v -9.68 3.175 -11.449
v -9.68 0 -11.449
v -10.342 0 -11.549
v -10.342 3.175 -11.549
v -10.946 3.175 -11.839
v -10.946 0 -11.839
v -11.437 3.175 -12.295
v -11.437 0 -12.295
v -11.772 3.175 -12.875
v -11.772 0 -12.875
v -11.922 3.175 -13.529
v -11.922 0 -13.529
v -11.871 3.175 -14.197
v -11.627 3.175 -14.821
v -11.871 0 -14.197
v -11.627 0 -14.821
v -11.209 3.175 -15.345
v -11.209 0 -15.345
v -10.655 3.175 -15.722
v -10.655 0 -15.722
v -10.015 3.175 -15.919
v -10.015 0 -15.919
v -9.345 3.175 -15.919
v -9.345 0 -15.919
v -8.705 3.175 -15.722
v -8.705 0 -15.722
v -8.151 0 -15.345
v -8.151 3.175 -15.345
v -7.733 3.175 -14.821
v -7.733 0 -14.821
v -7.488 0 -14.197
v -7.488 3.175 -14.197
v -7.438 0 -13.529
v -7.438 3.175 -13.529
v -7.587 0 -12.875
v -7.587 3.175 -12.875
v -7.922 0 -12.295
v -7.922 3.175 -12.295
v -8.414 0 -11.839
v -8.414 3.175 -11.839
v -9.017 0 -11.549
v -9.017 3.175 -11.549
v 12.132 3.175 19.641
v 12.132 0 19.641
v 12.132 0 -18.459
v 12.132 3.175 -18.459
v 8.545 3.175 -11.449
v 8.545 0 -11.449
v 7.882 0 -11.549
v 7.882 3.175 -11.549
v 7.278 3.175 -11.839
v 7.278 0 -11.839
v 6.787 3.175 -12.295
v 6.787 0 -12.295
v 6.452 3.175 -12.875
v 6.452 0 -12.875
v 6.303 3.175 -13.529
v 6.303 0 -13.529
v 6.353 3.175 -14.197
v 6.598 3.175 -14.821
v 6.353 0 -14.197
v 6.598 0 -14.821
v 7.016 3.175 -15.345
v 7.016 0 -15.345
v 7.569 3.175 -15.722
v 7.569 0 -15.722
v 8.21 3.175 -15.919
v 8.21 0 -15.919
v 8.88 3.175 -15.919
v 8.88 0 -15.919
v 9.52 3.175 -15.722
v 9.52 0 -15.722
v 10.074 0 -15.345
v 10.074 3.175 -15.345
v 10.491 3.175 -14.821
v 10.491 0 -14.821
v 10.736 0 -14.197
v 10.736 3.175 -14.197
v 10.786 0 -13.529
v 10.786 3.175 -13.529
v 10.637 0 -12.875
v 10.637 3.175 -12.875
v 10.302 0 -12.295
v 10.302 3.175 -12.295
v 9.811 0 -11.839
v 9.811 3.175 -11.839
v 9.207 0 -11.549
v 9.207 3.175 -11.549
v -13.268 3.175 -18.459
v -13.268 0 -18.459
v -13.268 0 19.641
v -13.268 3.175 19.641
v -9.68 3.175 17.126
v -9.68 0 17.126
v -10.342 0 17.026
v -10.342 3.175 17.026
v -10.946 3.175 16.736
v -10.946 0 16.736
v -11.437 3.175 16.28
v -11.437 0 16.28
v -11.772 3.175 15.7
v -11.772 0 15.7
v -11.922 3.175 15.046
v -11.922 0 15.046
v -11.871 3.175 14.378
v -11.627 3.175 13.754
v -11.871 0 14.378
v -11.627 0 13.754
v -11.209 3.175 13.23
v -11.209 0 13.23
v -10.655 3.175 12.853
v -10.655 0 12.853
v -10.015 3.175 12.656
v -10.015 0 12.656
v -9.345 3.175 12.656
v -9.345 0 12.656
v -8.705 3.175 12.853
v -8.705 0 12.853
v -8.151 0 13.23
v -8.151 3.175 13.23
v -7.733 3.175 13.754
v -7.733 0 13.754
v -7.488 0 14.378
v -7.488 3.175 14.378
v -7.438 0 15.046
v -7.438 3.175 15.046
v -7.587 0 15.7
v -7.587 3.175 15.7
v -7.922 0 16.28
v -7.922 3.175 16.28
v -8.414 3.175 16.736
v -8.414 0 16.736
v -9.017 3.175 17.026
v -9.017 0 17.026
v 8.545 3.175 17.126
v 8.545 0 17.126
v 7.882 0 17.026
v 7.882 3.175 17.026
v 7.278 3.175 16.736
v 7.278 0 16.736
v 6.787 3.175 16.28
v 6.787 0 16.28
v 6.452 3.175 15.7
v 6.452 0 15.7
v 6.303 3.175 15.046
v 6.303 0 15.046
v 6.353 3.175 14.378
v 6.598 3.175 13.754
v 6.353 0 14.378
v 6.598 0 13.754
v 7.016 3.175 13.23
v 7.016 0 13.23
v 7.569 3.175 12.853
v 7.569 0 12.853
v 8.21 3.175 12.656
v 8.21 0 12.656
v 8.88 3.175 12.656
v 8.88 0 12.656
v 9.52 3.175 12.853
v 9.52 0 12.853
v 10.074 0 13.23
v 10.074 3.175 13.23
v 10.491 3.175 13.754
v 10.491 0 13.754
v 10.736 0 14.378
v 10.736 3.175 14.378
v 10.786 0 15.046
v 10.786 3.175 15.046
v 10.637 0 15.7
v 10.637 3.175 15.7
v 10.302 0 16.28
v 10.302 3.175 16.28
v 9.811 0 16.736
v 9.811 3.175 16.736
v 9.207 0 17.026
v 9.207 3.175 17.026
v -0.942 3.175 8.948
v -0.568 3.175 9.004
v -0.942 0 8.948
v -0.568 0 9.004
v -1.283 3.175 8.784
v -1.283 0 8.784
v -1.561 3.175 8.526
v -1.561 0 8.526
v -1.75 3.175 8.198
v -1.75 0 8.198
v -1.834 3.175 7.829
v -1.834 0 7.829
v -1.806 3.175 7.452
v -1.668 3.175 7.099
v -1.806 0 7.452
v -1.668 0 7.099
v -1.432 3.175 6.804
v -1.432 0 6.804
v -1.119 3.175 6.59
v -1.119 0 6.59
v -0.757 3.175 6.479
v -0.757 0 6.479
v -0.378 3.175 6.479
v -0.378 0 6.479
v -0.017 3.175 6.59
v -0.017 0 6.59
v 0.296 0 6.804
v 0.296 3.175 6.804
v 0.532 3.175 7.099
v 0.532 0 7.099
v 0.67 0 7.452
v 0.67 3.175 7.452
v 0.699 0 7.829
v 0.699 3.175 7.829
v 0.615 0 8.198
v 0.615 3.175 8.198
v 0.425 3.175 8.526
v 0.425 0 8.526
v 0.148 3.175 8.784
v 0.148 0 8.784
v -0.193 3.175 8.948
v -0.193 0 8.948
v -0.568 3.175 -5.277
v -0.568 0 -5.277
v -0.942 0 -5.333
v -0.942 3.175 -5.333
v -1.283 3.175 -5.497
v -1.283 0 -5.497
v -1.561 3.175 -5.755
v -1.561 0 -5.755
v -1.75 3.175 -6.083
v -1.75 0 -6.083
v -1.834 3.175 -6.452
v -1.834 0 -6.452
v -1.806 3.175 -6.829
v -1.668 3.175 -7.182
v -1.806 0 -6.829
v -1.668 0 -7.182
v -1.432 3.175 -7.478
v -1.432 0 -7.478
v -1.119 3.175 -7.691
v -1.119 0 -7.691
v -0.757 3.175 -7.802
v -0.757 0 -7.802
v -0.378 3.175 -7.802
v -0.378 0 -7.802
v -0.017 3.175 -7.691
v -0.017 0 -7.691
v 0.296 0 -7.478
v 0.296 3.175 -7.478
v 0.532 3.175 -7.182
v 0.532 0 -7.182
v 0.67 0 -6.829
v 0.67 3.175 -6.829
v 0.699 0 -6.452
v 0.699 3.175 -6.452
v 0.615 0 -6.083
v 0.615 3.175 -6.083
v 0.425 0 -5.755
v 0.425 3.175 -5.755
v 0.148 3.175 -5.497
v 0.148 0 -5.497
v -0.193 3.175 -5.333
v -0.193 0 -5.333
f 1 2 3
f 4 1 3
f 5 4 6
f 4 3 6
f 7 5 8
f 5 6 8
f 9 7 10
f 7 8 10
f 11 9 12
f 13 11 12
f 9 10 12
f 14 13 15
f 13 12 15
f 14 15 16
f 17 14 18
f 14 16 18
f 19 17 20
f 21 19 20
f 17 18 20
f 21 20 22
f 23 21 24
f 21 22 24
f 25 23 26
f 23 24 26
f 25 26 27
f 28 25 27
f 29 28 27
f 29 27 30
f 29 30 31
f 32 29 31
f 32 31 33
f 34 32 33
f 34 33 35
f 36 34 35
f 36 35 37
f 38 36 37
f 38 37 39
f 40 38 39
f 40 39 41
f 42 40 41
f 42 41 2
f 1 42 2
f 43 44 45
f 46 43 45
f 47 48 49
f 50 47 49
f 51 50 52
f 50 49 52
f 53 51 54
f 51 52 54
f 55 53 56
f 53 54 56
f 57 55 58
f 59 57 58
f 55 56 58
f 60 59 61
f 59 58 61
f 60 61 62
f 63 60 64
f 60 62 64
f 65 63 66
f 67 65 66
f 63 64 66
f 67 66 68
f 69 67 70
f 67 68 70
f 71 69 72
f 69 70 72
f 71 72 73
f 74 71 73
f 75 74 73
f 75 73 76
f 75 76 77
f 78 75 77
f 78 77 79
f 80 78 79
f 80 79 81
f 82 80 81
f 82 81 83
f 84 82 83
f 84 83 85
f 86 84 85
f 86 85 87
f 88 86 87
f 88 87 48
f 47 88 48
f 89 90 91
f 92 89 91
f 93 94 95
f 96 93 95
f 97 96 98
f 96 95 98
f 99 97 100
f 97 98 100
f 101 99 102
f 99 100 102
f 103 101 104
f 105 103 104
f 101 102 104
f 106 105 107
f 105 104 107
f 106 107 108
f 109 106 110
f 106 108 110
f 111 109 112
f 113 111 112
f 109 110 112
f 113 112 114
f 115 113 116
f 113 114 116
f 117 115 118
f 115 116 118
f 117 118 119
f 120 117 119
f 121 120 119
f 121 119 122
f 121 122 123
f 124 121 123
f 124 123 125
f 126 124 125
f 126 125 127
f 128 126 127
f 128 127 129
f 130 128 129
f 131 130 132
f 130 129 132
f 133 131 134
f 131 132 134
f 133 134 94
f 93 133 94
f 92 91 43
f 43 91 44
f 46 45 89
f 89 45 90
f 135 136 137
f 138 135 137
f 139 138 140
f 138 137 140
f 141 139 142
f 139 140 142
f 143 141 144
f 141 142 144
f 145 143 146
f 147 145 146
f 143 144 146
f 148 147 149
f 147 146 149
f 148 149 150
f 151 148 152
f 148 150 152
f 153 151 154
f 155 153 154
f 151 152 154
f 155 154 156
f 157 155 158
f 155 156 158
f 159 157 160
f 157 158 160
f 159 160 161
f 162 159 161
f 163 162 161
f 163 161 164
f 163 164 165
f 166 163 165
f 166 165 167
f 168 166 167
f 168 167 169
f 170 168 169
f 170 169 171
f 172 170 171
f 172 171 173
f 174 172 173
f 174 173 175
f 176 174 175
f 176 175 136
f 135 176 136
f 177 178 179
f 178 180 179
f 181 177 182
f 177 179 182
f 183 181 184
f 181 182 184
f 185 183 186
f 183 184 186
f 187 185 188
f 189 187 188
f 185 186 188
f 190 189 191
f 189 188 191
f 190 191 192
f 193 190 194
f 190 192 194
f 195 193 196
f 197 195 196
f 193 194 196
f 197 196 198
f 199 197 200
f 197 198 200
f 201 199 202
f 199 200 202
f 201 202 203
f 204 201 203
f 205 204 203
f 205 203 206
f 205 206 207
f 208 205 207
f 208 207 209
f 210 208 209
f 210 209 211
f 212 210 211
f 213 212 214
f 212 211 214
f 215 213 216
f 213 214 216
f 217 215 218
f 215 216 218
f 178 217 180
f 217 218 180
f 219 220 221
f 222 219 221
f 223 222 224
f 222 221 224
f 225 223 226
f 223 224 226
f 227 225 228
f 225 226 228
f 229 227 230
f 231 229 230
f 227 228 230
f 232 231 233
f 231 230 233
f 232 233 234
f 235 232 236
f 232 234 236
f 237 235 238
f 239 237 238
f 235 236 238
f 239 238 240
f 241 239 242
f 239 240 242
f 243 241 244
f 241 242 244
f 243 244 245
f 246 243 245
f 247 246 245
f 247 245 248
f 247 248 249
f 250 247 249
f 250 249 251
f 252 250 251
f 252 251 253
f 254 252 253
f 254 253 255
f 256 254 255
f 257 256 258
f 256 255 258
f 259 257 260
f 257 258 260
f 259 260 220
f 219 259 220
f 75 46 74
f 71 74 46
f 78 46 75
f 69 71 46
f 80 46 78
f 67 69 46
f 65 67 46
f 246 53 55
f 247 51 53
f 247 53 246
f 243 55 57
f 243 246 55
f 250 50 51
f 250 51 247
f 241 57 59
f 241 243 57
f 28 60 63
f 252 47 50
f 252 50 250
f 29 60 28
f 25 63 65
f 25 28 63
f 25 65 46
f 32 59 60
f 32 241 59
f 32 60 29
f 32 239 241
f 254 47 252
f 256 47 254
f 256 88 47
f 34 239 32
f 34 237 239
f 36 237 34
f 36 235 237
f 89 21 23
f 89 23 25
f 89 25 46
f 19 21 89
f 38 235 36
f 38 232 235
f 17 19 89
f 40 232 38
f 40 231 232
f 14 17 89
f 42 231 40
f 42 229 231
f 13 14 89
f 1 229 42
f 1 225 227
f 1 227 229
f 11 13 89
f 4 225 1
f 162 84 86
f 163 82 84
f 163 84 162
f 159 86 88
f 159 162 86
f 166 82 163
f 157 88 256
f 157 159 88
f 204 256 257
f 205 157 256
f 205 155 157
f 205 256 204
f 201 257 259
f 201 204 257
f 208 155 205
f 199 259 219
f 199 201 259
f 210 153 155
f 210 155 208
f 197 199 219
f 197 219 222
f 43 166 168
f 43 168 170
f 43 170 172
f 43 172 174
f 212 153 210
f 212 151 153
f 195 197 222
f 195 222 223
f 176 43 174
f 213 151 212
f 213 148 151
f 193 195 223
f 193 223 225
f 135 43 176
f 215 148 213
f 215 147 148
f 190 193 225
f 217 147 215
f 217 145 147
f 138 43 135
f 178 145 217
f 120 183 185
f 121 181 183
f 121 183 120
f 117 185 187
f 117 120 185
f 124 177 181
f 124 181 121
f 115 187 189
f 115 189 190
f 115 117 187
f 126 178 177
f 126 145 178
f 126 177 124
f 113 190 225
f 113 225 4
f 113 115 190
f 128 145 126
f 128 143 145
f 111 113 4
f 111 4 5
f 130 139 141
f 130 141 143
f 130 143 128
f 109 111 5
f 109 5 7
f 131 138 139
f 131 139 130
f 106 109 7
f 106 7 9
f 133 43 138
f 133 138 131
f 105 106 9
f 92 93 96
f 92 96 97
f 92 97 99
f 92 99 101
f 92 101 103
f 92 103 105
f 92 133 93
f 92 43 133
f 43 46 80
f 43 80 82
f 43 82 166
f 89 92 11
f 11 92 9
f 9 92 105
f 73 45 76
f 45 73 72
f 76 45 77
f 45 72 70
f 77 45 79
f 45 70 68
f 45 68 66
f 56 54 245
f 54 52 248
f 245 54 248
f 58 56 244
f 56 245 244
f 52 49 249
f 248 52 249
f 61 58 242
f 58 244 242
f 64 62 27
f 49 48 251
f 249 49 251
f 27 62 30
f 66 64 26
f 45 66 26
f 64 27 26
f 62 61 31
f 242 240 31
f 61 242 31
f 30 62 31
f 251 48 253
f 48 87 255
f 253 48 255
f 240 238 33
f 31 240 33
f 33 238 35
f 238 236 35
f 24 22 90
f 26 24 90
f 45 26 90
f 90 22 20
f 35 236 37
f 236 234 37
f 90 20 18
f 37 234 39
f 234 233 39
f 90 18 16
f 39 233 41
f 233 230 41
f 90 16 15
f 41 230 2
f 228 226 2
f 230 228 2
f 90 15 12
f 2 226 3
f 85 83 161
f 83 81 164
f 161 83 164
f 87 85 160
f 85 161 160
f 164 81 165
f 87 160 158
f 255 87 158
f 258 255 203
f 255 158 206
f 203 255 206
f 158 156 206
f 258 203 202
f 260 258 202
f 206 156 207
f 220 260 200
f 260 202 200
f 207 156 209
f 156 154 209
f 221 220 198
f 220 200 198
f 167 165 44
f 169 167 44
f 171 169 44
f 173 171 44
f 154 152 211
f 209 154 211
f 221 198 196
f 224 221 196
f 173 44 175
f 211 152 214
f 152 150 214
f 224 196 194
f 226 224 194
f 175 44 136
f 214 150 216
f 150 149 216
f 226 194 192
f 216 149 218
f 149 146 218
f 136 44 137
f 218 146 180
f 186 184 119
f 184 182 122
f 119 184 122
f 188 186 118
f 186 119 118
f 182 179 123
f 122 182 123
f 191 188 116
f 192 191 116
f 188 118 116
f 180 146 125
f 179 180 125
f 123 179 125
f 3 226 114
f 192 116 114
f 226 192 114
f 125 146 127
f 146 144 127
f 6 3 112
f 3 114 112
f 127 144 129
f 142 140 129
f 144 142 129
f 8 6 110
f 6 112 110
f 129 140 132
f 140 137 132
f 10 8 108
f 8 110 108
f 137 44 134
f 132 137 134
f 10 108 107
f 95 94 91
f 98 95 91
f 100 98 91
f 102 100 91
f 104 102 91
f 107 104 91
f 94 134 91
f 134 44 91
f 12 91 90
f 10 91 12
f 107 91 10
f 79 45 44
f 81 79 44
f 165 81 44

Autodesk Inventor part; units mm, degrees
ref_plane "YZ Plane" through (0, 0, 0) normal (1, 0, 0) x (0, 1, 0)
ref_plane "XZ Plane" through (0, 0, 0) normal (0, 1, 0) x (-1, 0, 0)
ref_plane "XY Plane" through (0, 0, 0) normal (0, 0, 1) x (1, 0, 0)
sketch "Sketch1" plane through (0, 0, 0) normal (0, 1, 0) x (-1, 0, 0)
  line L0 (13.2677, 19.6408) -> (-12.1323, 19.6408)
  line L1 (-12.1323, 19.6408) -> (-12.1323, -18.4592)
  line L2 (-12.1323, -18.4592) -> (13.2677, -18.4592)
  line L3 (13.2677, -18.4592) -> (13.2677, 19.6408)
  point P0 (0, 0)
  dimension "d0" = 25.4
  dimension "d1" = 38.1
extrude "Extrusion1" add sketch "Sketch1" along normal blind 3.175
hole "Hole1" at (-9.6799, 3.175, 14.8783) direction (0, -1, 0) diameter 4.4958 depth 3.175 clearance for "Flat Head Machine Screw (82)" size "#8" standard "Ansi Unified Screw Threads"
hole "Hole2" at (8.5446, 3.175, 14.8783) direction (0, -1, 0) diameter 4.4958 depth 3.175 clearance for "Flat Head Machine Screw (82)" size "#8" standard "Ansi Unified Screw Threads"
hole "Hole3" at (-9.6799, 3.175, -13.6967) direction (0, -1, 0) diameter 4.4958 depth 3.175 clearance for "Flat Head Machine Screw (82)" size "#8" standard "Ansi Unified Screw Threads"
hole "Hole4" at (8.5446, 3.175, -13.6967) direction (0, -1, 0) diameter 4.4958 depth 3.175 clearance for "Flat Head Machine Screw (82)" size "#8" standard "Ansi Unified Screw Threads"
hole "Hole5" at (-0.5677, 3.175, -6.5466) direction (0, -1, 0) diameter 2.54 depth 3.175
hole "Hole6" at (-0.5677, 3.175, 7.7345) direction (0, -1, 0) diameter 2.54 depth 3.175
properties part number "Shield_1"
